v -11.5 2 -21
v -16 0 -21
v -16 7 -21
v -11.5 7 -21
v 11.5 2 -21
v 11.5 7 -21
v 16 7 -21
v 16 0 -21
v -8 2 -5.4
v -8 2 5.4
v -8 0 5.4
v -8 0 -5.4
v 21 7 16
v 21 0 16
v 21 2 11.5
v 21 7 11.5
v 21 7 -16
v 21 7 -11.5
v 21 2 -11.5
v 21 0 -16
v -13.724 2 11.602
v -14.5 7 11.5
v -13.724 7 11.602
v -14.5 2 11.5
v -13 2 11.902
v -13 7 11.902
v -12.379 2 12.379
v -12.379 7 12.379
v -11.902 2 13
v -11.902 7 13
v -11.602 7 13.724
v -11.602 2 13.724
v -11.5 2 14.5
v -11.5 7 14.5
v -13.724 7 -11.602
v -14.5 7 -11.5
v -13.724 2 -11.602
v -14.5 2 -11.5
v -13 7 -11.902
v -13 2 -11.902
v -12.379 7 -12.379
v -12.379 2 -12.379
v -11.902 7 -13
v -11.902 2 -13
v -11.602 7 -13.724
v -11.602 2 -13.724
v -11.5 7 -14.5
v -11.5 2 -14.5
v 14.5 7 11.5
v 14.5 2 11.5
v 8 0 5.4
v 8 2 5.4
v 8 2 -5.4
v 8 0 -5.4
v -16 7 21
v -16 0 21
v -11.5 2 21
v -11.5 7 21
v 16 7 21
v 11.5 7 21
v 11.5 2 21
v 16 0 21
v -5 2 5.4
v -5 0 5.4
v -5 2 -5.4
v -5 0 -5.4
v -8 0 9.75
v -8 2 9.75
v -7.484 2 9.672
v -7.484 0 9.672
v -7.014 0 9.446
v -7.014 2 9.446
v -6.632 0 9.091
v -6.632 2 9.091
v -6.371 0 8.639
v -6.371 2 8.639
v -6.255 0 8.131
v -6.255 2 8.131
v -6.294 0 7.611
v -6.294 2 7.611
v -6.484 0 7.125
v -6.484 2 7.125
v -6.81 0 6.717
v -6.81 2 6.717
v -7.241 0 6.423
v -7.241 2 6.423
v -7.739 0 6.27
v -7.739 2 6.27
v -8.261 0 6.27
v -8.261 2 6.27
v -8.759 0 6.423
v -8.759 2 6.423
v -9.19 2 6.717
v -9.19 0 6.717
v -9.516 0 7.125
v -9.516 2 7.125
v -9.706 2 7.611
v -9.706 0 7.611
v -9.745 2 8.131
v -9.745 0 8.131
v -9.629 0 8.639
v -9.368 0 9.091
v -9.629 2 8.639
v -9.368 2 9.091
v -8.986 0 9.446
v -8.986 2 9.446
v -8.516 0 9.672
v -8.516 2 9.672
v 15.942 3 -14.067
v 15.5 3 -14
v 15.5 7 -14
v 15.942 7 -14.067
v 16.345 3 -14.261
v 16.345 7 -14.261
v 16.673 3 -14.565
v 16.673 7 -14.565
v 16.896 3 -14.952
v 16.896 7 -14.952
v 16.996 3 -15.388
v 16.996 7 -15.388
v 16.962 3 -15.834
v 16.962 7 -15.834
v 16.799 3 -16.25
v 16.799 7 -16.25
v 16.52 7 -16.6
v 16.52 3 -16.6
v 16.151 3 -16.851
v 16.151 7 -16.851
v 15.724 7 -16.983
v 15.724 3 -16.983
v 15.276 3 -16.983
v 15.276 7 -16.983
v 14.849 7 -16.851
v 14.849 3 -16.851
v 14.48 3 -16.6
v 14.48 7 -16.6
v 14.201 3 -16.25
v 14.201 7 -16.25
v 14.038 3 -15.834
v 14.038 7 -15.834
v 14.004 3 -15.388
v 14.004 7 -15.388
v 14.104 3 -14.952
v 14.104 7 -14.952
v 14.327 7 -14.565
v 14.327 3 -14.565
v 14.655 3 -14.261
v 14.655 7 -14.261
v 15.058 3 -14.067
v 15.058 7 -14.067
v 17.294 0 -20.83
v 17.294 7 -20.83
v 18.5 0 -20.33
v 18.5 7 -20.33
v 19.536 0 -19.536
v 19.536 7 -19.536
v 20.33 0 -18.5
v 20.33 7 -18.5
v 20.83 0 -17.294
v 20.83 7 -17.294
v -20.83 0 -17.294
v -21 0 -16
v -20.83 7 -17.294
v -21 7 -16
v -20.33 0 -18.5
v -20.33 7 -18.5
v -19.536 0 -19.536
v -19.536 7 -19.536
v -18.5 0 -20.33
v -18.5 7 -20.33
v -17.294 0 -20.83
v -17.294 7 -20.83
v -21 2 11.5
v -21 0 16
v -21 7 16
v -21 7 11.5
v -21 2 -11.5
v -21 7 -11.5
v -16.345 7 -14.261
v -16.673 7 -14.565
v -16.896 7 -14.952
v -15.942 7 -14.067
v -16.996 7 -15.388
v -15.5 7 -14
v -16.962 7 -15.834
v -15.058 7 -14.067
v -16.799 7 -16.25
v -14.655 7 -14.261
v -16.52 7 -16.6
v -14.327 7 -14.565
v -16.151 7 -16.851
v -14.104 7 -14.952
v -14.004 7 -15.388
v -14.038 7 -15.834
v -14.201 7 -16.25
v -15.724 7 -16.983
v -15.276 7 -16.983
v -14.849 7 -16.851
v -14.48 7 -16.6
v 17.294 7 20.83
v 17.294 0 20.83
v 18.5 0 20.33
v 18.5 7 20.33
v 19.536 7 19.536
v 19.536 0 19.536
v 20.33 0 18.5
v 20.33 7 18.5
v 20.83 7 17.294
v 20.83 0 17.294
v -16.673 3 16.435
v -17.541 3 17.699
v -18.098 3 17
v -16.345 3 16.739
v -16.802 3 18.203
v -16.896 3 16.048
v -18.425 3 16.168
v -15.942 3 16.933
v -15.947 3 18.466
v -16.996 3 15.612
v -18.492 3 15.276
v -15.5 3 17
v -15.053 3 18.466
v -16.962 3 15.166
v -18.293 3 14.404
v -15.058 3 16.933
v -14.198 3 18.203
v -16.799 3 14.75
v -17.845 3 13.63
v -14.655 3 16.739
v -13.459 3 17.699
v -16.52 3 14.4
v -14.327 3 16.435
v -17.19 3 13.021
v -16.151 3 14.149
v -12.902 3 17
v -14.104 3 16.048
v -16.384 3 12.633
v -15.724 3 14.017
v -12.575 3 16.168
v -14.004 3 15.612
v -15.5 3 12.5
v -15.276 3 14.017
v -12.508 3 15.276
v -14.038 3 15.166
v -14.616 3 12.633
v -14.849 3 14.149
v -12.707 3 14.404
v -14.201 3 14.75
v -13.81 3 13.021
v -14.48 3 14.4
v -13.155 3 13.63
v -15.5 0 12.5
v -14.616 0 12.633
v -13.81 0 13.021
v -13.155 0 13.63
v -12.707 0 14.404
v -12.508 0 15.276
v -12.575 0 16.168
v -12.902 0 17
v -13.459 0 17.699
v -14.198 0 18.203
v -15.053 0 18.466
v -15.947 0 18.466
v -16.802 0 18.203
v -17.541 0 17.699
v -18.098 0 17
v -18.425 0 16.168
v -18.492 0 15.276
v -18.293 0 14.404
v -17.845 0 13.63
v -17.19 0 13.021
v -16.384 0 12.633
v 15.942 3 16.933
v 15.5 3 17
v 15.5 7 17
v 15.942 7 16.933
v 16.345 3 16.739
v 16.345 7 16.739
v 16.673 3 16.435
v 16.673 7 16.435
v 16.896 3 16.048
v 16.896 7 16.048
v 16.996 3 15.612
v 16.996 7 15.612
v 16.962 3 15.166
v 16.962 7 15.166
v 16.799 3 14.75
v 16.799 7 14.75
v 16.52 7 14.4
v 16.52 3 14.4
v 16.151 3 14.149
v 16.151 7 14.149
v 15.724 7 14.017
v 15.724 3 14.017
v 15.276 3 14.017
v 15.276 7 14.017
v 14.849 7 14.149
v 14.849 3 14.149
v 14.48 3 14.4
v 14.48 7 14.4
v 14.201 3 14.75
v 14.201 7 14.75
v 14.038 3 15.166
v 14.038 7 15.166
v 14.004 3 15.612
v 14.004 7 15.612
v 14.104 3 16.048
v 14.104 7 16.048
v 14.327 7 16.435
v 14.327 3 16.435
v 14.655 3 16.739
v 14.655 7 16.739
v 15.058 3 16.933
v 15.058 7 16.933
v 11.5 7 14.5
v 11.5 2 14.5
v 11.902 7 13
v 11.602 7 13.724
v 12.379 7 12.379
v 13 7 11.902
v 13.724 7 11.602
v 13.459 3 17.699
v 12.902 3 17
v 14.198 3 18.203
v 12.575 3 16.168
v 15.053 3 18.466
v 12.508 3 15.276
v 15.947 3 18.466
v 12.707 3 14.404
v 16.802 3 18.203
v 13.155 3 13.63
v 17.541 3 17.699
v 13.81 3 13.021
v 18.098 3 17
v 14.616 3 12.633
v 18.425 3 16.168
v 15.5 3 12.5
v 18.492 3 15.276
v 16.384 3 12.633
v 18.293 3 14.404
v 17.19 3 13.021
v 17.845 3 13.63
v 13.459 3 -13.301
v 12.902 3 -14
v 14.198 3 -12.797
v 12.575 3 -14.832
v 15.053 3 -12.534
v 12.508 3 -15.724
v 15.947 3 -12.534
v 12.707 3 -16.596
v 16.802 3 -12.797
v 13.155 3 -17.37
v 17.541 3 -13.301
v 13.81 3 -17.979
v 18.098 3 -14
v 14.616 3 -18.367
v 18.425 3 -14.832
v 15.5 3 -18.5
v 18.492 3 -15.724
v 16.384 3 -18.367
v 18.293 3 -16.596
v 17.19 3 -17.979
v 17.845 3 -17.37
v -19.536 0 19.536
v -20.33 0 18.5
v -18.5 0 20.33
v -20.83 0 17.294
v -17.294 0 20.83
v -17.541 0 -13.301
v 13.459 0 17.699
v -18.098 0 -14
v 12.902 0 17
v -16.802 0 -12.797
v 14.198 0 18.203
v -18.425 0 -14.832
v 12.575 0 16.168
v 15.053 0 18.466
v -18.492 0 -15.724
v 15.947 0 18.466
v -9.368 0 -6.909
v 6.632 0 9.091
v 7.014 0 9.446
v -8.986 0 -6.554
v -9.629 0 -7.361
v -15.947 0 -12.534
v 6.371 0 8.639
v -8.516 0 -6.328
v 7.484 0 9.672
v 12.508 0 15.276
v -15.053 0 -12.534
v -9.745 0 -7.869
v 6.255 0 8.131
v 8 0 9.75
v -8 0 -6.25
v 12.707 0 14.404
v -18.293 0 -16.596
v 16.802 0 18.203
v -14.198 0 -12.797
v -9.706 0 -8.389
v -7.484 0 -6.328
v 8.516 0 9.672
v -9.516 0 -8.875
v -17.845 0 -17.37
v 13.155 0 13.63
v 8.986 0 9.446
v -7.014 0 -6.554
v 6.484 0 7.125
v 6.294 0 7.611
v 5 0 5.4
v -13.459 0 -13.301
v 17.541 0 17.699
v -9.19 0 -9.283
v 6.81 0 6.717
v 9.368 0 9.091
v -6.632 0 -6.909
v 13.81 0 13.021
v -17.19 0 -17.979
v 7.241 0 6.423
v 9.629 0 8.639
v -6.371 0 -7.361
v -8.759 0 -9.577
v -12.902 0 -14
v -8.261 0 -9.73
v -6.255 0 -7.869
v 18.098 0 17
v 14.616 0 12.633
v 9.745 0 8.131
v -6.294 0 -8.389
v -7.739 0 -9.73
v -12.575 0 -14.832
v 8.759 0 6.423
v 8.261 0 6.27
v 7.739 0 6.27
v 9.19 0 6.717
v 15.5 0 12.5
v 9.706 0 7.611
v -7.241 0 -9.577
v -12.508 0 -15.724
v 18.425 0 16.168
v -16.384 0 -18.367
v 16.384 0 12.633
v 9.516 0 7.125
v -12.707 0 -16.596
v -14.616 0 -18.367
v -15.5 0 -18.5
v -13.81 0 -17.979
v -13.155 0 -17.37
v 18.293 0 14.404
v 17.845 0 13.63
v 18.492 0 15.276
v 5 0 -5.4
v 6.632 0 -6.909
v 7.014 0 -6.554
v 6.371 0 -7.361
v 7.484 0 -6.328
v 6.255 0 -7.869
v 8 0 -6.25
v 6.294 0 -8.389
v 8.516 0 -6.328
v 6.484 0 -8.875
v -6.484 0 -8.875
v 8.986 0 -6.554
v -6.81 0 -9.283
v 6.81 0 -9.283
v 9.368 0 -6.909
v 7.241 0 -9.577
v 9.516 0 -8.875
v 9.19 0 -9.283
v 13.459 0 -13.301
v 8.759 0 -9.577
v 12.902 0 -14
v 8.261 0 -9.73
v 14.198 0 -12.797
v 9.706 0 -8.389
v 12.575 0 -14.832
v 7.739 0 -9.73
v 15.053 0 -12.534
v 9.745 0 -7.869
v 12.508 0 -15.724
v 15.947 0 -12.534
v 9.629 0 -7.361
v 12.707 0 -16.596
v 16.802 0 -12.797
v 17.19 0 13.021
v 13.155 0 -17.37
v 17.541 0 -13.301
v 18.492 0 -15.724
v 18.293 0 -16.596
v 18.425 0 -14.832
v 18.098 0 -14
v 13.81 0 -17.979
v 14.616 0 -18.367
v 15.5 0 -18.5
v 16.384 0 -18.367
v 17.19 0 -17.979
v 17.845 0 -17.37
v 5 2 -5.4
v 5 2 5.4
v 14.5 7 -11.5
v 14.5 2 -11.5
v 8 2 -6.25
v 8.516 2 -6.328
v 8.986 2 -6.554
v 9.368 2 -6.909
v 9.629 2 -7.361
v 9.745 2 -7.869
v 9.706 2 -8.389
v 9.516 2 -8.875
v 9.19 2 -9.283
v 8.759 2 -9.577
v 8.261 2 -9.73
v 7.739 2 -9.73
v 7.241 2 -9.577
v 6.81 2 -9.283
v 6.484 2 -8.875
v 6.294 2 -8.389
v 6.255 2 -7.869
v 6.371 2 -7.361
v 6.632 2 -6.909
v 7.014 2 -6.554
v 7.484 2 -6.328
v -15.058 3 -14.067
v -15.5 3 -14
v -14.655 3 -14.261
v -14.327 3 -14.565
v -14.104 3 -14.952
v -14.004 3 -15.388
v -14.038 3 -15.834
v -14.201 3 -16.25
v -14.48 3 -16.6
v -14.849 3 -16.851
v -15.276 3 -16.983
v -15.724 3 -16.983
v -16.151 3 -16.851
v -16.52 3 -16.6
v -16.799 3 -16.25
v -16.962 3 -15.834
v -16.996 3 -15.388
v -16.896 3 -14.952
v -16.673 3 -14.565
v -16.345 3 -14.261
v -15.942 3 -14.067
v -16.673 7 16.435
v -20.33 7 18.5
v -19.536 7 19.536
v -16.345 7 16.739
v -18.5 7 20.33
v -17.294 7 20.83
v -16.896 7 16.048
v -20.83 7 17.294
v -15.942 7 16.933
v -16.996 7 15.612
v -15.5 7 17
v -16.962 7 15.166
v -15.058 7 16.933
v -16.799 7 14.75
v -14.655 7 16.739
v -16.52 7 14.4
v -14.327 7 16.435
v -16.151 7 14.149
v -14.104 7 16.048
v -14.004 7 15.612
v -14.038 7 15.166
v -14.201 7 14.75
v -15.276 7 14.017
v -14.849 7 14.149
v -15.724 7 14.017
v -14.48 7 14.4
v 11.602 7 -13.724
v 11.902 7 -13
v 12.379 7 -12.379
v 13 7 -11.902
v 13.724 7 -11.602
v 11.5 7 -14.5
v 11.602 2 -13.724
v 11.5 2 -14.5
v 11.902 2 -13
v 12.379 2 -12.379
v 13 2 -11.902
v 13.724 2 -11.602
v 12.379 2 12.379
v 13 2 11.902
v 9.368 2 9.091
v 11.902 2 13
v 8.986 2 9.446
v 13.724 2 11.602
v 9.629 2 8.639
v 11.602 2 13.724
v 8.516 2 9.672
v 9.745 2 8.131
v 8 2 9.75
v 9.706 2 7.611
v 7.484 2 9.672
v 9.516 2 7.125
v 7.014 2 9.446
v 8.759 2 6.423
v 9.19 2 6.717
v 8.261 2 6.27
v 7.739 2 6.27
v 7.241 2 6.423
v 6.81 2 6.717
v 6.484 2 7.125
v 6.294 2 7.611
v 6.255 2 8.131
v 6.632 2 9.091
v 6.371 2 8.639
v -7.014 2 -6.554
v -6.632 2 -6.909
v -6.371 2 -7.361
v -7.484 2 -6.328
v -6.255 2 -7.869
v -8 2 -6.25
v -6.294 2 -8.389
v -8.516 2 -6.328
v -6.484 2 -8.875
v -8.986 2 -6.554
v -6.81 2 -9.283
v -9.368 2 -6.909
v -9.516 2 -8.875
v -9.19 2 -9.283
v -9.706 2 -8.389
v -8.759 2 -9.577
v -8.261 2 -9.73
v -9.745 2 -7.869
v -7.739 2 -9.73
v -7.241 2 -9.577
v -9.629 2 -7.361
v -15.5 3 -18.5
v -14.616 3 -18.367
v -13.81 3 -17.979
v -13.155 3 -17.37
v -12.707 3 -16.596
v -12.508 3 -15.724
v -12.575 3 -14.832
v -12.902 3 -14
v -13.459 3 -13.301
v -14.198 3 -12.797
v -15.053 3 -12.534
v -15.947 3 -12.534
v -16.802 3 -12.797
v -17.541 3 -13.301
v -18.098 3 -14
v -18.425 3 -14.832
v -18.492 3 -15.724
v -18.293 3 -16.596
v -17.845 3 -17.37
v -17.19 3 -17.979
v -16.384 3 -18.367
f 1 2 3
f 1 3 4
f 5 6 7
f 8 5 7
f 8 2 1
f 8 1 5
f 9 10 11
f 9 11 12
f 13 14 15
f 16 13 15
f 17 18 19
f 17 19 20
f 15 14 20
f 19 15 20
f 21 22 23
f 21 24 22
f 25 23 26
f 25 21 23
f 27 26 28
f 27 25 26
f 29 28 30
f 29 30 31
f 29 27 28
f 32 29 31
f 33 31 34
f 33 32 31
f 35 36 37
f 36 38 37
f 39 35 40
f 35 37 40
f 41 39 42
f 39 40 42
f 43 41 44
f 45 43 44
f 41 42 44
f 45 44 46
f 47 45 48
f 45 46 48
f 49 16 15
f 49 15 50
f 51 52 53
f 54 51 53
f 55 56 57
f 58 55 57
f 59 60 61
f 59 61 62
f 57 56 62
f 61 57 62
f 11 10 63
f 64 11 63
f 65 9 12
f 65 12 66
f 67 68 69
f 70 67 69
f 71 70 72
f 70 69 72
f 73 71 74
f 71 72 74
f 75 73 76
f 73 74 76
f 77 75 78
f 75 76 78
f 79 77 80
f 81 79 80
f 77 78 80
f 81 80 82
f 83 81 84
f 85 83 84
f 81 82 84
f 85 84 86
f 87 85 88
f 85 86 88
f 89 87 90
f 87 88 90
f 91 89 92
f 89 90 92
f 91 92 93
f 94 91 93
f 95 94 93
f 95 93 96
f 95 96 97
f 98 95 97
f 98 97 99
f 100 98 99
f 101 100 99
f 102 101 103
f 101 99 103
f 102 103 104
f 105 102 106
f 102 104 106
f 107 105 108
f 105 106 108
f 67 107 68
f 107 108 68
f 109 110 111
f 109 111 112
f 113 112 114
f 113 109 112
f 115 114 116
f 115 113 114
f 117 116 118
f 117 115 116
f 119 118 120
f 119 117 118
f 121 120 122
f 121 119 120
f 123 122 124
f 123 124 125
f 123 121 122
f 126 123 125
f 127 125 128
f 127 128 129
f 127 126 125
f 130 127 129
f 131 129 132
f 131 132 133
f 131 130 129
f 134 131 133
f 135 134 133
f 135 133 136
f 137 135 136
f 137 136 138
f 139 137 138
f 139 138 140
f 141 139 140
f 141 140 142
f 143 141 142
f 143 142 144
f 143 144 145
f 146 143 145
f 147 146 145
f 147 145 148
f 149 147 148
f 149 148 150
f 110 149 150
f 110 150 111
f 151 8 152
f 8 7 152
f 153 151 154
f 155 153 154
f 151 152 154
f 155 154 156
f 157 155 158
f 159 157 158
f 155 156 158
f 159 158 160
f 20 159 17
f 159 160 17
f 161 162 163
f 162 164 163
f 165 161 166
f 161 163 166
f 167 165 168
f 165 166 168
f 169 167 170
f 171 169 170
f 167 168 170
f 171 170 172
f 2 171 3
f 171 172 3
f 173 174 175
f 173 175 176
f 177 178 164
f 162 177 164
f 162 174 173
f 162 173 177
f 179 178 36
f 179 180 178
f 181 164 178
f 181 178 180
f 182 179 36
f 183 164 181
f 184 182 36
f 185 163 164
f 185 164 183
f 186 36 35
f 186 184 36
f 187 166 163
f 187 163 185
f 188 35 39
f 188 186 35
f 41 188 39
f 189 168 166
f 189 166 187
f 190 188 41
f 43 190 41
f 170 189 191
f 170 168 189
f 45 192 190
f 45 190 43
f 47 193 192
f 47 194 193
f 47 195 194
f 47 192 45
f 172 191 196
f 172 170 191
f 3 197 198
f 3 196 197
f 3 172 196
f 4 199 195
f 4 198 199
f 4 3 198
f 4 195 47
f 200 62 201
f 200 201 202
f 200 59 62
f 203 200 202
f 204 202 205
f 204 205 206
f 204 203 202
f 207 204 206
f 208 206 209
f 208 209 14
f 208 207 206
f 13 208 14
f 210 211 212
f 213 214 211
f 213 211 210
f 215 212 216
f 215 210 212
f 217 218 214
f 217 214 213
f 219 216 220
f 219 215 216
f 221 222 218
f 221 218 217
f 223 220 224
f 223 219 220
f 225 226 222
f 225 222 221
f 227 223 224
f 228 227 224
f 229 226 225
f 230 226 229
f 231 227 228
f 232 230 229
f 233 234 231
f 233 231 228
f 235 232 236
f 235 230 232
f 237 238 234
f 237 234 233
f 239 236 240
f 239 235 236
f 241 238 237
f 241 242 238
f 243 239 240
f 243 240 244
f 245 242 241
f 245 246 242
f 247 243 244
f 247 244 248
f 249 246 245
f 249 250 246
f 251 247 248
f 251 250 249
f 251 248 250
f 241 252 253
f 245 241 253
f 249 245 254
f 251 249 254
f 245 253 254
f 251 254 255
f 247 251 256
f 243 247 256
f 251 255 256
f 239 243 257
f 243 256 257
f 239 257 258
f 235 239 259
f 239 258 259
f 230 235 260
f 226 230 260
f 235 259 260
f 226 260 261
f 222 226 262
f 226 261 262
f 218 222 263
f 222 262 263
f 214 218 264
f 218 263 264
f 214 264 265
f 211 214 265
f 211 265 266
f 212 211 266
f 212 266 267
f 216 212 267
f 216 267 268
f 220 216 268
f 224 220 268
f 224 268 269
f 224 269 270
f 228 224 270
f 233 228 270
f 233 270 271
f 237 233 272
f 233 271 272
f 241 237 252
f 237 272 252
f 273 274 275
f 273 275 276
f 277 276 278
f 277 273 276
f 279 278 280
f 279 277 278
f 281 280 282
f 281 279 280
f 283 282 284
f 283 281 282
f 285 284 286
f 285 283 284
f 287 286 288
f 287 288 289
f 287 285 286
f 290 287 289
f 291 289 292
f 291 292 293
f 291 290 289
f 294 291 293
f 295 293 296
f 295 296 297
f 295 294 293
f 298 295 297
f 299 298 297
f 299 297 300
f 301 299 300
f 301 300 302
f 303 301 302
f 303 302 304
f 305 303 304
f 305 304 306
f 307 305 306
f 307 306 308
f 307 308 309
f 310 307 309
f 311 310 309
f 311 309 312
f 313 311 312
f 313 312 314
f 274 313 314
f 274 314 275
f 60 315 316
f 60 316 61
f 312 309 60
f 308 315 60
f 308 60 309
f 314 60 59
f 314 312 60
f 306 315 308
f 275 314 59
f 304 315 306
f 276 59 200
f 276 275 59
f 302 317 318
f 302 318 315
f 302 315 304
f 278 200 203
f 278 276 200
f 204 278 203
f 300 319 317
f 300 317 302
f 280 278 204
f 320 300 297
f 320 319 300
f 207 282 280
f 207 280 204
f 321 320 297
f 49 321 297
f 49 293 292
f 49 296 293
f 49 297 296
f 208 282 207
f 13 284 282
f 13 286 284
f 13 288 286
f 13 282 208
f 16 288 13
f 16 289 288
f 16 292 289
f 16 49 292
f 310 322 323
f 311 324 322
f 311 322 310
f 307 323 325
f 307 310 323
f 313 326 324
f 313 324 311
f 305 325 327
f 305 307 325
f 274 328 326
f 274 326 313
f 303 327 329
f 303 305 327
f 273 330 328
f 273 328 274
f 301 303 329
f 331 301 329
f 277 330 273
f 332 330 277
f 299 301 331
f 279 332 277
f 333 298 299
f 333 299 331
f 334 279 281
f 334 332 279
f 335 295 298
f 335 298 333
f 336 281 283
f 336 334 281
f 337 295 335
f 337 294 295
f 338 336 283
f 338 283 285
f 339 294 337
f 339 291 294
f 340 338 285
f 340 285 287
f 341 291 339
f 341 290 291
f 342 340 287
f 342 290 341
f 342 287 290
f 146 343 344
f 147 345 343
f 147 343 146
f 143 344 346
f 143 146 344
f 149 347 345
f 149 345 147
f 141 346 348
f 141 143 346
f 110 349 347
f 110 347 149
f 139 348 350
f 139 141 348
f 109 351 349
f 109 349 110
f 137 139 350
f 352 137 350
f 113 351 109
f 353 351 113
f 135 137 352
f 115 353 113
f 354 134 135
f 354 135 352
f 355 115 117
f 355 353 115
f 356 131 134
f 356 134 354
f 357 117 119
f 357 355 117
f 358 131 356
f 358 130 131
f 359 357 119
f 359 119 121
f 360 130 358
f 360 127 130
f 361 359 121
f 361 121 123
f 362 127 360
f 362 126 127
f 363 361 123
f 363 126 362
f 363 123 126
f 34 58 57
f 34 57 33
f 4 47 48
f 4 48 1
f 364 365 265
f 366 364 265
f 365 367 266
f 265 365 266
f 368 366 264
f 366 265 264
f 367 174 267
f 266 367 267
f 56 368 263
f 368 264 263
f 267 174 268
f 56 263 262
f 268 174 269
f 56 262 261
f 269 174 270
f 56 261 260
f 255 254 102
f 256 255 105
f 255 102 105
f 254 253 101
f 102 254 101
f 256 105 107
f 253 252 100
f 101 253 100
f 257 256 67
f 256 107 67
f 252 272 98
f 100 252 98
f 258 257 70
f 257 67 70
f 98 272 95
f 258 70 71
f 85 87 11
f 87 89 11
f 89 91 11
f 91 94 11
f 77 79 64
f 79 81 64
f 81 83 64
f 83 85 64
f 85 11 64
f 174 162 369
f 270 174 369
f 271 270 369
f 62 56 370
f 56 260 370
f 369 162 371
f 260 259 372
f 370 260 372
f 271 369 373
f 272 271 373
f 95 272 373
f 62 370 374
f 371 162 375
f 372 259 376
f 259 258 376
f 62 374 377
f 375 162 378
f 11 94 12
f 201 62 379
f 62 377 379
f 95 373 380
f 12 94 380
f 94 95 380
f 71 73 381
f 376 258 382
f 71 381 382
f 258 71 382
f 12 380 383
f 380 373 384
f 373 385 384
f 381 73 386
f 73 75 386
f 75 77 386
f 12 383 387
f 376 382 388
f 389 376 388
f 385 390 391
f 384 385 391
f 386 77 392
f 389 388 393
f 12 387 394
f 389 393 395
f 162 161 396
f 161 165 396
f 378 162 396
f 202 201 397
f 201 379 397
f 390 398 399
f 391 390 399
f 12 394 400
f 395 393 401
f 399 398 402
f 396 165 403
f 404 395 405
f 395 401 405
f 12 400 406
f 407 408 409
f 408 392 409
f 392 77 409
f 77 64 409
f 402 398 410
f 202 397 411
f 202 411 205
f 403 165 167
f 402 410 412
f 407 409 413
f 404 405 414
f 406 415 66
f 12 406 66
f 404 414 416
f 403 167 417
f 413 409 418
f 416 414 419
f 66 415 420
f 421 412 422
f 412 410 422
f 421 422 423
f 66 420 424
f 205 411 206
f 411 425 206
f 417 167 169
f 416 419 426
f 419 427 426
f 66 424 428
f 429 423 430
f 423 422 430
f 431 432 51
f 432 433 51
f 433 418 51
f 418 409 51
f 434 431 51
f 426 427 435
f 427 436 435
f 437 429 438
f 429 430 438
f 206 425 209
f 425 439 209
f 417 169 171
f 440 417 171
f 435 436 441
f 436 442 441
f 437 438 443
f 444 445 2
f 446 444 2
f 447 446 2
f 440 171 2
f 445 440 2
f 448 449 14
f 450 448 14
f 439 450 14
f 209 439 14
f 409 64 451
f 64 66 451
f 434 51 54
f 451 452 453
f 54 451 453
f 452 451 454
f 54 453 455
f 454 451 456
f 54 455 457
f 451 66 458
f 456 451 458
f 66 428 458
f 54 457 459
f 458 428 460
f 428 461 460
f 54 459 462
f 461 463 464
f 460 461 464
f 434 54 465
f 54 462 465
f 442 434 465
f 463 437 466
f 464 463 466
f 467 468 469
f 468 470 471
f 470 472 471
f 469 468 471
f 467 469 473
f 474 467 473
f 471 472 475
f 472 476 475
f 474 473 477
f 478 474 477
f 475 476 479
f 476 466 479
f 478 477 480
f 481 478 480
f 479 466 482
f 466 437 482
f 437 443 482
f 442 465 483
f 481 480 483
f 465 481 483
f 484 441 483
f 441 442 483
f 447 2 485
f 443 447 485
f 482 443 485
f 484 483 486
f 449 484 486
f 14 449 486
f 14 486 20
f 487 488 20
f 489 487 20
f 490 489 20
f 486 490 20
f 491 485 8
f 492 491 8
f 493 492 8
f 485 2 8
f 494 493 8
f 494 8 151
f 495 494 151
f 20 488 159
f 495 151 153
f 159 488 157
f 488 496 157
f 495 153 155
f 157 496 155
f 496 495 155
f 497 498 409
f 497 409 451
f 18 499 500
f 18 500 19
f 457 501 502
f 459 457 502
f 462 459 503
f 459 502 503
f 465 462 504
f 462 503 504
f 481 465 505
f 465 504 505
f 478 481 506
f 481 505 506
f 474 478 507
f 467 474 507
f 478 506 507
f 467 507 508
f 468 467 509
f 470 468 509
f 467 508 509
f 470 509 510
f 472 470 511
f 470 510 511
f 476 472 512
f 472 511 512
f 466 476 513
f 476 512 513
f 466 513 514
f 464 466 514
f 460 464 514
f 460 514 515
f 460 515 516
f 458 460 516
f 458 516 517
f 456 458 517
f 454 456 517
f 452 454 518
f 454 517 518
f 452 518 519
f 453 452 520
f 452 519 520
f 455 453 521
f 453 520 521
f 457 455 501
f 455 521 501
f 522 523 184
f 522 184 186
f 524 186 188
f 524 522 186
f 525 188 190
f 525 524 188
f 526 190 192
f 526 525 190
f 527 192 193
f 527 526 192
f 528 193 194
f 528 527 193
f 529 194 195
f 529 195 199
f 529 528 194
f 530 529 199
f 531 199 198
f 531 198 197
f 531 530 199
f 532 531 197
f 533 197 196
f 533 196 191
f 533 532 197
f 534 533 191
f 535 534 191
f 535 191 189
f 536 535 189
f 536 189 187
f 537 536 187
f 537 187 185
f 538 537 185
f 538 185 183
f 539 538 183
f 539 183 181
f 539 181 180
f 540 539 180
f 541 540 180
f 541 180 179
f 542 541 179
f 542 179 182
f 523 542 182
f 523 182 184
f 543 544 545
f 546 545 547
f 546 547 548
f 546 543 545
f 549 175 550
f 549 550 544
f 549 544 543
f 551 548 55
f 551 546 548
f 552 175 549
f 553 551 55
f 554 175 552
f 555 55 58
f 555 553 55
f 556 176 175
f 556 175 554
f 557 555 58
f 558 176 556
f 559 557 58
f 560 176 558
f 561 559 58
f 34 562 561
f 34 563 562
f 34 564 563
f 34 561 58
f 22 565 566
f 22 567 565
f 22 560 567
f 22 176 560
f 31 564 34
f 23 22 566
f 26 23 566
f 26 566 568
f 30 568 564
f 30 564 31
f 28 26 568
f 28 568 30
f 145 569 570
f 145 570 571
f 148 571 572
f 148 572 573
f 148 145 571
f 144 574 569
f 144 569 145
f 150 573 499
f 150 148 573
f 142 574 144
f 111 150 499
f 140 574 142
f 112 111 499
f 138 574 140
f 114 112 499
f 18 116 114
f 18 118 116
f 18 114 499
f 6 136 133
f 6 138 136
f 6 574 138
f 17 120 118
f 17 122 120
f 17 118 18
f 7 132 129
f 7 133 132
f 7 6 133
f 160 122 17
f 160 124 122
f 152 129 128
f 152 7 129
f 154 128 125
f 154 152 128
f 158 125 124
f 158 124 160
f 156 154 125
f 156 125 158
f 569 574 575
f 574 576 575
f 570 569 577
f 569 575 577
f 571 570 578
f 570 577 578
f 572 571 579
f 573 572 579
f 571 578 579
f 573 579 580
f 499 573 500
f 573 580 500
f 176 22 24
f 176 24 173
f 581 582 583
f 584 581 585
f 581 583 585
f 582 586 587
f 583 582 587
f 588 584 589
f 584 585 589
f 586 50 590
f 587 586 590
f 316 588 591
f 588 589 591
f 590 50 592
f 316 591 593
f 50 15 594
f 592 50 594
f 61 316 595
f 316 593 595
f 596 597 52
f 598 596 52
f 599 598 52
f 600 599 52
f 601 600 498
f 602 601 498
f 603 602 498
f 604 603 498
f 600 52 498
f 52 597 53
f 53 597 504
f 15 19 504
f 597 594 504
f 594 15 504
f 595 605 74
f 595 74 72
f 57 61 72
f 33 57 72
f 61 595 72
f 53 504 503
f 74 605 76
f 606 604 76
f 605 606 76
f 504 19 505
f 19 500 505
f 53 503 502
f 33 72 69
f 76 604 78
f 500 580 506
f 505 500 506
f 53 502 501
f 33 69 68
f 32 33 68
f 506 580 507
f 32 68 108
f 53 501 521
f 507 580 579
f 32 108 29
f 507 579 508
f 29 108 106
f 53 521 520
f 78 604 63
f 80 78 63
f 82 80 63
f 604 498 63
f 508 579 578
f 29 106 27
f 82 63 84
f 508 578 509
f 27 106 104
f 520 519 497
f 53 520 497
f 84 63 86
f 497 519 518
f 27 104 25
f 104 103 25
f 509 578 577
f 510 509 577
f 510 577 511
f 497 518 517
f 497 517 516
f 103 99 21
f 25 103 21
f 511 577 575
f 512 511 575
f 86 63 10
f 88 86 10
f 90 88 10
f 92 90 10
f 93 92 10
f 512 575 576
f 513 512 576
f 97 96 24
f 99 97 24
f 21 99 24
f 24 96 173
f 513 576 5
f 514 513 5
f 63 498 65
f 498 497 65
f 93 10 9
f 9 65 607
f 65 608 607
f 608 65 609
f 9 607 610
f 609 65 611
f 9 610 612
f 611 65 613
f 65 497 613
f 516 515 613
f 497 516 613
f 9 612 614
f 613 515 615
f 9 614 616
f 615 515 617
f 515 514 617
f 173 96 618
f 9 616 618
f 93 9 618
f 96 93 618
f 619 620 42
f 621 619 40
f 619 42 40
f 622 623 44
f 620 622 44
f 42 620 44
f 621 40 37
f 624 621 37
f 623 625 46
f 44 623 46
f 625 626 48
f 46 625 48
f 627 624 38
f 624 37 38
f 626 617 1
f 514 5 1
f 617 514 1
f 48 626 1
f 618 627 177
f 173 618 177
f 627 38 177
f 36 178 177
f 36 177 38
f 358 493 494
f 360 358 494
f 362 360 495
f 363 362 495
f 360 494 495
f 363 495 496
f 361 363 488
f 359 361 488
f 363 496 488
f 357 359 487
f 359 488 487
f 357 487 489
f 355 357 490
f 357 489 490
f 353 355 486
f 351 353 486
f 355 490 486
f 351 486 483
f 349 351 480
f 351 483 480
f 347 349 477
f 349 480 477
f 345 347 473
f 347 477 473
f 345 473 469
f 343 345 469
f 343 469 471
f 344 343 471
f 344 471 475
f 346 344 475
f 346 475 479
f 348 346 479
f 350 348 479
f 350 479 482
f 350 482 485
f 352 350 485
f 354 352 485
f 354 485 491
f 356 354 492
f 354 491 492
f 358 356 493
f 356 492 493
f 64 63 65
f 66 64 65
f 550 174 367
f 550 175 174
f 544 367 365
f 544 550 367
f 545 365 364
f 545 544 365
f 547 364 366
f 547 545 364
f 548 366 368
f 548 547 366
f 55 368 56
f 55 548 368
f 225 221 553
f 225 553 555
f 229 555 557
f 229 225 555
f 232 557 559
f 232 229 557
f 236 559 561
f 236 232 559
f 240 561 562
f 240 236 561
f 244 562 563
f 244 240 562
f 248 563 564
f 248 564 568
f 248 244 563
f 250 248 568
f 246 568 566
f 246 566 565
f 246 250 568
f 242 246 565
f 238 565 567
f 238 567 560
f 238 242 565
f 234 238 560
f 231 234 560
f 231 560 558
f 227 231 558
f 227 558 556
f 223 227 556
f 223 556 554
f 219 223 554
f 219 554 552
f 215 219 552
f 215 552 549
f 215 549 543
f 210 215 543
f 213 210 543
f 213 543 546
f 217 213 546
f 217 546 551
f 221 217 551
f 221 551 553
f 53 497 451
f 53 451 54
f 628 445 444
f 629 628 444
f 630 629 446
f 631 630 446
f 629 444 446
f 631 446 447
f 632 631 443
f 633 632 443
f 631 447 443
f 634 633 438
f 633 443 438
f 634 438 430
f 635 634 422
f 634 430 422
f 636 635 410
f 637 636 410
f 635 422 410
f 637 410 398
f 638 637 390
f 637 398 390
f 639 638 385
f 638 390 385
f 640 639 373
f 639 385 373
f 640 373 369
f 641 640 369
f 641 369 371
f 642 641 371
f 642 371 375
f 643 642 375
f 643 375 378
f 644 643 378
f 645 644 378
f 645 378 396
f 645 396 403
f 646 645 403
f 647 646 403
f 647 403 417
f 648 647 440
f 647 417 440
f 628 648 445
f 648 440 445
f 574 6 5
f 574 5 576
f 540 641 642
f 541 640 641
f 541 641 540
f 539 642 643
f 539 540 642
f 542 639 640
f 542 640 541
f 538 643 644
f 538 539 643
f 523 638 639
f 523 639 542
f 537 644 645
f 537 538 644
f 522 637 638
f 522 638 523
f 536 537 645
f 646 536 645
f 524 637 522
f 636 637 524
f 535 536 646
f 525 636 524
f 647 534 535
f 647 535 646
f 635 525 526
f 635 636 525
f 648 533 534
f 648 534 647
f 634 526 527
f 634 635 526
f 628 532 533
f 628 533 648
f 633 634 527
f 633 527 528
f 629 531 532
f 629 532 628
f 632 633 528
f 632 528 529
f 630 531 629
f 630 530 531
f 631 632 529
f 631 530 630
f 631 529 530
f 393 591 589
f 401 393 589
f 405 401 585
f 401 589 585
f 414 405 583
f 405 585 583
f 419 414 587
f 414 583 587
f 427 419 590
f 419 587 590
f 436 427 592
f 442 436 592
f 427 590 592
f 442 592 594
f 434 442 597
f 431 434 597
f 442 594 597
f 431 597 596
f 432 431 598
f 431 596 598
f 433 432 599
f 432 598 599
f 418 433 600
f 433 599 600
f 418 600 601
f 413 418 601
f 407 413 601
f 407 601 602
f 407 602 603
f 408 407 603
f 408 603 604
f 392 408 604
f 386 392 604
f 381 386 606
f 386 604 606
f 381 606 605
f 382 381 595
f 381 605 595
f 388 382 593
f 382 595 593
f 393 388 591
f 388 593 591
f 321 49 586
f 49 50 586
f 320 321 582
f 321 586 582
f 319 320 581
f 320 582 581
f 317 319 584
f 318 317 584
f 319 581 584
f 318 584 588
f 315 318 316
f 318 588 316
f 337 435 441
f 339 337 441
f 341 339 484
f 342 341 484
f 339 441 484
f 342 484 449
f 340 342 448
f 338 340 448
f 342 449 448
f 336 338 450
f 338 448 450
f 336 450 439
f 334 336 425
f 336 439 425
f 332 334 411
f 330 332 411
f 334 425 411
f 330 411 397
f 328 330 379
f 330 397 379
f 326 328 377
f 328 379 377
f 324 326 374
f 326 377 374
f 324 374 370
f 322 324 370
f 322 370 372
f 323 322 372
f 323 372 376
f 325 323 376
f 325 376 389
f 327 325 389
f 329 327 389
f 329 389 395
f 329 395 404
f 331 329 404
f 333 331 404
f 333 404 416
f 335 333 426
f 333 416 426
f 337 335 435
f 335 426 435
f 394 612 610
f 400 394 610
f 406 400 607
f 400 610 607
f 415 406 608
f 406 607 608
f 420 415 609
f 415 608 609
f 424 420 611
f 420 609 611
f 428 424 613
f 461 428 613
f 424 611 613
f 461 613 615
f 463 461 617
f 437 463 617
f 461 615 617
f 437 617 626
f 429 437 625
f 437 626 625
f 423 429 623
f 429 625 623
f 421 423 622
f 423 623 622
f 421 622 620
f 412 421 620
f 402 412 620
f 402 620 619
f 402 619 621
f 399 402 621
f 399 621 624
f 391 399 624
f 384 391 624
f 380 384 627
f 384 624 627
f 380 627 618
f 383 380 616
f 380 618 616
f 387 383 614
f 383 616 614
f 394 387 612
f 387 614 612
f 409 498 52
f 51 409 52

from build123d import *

# Parameters (mm, degrees)
SKETCH1_W           = 42
SKETCH1_H           = 42
SKETCH1_R           = 1.5
BOSS_EXTRUDE1_DEPTH = 7
CUT_EXTRUDE1_DEPTH  = 5
SKETCH4_R           = 1.75
CUT_EXTRUDE3_DEPTH  = 2
SKETCH5_W           = 3
SKETCH5_H           = 10.8
CUT_EXTRUDE4_DEPTH  = 4
SKETCH6_R           = 3
CUT_EXTRUDE5_DEPTH  = 3
FILLET1_R           = 5
FILLET2_R           = 3


with BuildPart() as part:
    # Sketch1 → Boss-Extrude1 (new body)
    with BuildSketch(Plane(origin=(0, 0, 0), x_dir=(1, 0, 0), z_dir=(0, 1, 0))):
        Rectangle(SKETCH1_W, SKETCH1_H)
        with Locations(Location((-15.5, 15.5, 0), (0, 0, 270))):
            Circle(SKETCH1_R, mode=Mode.SUBTRACT)
        with Locations(Location((15.5, 15.5, 0), (0, 0, 270))):
            Circle(SKETCH1_R, mode=Mode.SUBTRACT)
        with Locations(Location((-15.5, -15.5, 0), (0, 0, 270))):
            Circle(SKETCH1_R, mode=Mode.SUBTRACT)
        with Locations(Location((15.5, -15.5, 0), (0, 0, 270))):
            Circle(SKETCH1_R, mode=Mode.SUBTRACT)
    extrude(amount=BOSS_EXTRUDE1_DEPTH)

    # Sketch2 → Cut-Extrude1 (cut)
    with BuildSketch(Plane(origin=(0, 7, 0), x_dir=(1, 0, 0), z_dir=(0, 1, 0))):
        Polygon((-11.5, 11.5), (-11.5, 21), (11.5, 21), (11.5, 11.5), (21, 11.5), (21, -11.5), (11.5, -11.5), (11.5, -21), (-11.5, -21), (-11.5, -11.5), (-21, -11.5), (-21, 11.5), align=None)
    extrude(amount=-CUT_EXTRUDE1_DEPTH, mode=Mode.SUBTRACT)

    # Sketch4 → Cut-Extrude3 (cut)
    with BuildSketch(Plane(origin=(0, 2, 0), x_dir=(1, 0, 0), z_dir=(0, 1, 0))):
        with Locations(Location((8, 8, 0), (0, 0, 270))):
            Circle(SKETCH4_R)
        with Locations(Location((8, -8, 0), (0, 0, 270))):
            Circle(SKETCH4_R)
        with Locations(Location((-8, -8, 0), (0, 0, 270))):
            Circle(SKETCH4_R)
        with Locations(Location((-8, 8, 0), (0, 0, 270))):
            Circle(SKETCH4_R)
    extrude(amount=-CUT_EXTRUDE3_DEPTH, mode=Mode.SUBTRACT)

    # Sketch5 → Cut-Extrude4 (cut)
    with BuildSketch(Plane(origin=(0, 2, 0), x_dir=(1, 0, 0), z_dir=(0, 1, 0))):
        with Locations((6.5, 0)):
            Rectangle(SKETCH5_W, SKETCH5_H)
        with Locations((-6.5, 0)):
            Rectangle(SKETCH5_W, SKETCH5_H)
    extrude(amount=-CUT_EXTRUDE4_DEPTH, mode=Mode.SUBTRACT)

    # Sketch6 → Cut-Extrude5 (cut)
    with BuildSketch(Plane.XZ):
        with Locations(Location((-15.5, 15.5, 0), (0, 0, 270))):
            Circle(SKETCH6_R)
        with Locations(Location((15.5, 15.5, 0), (0, 0, 270))):
            Circle(SKETCH6_R)
        with Locations(Location((15.5, -15.5, 0), (0, 0, 270))):
            Circle(SKETCH6_R)
        with Locations(Location((-15.5, -15.5, 0), (0, 0, 270))):
            Circle(SKETCH6_R)
    extrude(amount=-CUT_EXTRUDE5_DEPTH, mode=Mode.SUBTRACT)

    # Fillet1
    fillet1_edges = [part.edges().sort_by_distance(p)[0] for p in [
        (21, 3.5, 21),
        (-21, 3.5, 21),
        (-21, 3.5, -21),
        (21, 3.5, -21),
    ]]
    fillet(fillet1_edges, radius=FILLET1_R)

    # Fillet2
    fillet2_edges = [part.edges().sort_by_distance(p)[0] for p in [
        (11.5, 4.5, 11.5),
        (-11.5, 4.5, 11.5),
        (-11.5, 4.5, -11.5),
        (11.5, 4.5, -11.5),
    ]]
    fillet(fillet2_edges, radius=FILLET2_R)


solid = part.part
